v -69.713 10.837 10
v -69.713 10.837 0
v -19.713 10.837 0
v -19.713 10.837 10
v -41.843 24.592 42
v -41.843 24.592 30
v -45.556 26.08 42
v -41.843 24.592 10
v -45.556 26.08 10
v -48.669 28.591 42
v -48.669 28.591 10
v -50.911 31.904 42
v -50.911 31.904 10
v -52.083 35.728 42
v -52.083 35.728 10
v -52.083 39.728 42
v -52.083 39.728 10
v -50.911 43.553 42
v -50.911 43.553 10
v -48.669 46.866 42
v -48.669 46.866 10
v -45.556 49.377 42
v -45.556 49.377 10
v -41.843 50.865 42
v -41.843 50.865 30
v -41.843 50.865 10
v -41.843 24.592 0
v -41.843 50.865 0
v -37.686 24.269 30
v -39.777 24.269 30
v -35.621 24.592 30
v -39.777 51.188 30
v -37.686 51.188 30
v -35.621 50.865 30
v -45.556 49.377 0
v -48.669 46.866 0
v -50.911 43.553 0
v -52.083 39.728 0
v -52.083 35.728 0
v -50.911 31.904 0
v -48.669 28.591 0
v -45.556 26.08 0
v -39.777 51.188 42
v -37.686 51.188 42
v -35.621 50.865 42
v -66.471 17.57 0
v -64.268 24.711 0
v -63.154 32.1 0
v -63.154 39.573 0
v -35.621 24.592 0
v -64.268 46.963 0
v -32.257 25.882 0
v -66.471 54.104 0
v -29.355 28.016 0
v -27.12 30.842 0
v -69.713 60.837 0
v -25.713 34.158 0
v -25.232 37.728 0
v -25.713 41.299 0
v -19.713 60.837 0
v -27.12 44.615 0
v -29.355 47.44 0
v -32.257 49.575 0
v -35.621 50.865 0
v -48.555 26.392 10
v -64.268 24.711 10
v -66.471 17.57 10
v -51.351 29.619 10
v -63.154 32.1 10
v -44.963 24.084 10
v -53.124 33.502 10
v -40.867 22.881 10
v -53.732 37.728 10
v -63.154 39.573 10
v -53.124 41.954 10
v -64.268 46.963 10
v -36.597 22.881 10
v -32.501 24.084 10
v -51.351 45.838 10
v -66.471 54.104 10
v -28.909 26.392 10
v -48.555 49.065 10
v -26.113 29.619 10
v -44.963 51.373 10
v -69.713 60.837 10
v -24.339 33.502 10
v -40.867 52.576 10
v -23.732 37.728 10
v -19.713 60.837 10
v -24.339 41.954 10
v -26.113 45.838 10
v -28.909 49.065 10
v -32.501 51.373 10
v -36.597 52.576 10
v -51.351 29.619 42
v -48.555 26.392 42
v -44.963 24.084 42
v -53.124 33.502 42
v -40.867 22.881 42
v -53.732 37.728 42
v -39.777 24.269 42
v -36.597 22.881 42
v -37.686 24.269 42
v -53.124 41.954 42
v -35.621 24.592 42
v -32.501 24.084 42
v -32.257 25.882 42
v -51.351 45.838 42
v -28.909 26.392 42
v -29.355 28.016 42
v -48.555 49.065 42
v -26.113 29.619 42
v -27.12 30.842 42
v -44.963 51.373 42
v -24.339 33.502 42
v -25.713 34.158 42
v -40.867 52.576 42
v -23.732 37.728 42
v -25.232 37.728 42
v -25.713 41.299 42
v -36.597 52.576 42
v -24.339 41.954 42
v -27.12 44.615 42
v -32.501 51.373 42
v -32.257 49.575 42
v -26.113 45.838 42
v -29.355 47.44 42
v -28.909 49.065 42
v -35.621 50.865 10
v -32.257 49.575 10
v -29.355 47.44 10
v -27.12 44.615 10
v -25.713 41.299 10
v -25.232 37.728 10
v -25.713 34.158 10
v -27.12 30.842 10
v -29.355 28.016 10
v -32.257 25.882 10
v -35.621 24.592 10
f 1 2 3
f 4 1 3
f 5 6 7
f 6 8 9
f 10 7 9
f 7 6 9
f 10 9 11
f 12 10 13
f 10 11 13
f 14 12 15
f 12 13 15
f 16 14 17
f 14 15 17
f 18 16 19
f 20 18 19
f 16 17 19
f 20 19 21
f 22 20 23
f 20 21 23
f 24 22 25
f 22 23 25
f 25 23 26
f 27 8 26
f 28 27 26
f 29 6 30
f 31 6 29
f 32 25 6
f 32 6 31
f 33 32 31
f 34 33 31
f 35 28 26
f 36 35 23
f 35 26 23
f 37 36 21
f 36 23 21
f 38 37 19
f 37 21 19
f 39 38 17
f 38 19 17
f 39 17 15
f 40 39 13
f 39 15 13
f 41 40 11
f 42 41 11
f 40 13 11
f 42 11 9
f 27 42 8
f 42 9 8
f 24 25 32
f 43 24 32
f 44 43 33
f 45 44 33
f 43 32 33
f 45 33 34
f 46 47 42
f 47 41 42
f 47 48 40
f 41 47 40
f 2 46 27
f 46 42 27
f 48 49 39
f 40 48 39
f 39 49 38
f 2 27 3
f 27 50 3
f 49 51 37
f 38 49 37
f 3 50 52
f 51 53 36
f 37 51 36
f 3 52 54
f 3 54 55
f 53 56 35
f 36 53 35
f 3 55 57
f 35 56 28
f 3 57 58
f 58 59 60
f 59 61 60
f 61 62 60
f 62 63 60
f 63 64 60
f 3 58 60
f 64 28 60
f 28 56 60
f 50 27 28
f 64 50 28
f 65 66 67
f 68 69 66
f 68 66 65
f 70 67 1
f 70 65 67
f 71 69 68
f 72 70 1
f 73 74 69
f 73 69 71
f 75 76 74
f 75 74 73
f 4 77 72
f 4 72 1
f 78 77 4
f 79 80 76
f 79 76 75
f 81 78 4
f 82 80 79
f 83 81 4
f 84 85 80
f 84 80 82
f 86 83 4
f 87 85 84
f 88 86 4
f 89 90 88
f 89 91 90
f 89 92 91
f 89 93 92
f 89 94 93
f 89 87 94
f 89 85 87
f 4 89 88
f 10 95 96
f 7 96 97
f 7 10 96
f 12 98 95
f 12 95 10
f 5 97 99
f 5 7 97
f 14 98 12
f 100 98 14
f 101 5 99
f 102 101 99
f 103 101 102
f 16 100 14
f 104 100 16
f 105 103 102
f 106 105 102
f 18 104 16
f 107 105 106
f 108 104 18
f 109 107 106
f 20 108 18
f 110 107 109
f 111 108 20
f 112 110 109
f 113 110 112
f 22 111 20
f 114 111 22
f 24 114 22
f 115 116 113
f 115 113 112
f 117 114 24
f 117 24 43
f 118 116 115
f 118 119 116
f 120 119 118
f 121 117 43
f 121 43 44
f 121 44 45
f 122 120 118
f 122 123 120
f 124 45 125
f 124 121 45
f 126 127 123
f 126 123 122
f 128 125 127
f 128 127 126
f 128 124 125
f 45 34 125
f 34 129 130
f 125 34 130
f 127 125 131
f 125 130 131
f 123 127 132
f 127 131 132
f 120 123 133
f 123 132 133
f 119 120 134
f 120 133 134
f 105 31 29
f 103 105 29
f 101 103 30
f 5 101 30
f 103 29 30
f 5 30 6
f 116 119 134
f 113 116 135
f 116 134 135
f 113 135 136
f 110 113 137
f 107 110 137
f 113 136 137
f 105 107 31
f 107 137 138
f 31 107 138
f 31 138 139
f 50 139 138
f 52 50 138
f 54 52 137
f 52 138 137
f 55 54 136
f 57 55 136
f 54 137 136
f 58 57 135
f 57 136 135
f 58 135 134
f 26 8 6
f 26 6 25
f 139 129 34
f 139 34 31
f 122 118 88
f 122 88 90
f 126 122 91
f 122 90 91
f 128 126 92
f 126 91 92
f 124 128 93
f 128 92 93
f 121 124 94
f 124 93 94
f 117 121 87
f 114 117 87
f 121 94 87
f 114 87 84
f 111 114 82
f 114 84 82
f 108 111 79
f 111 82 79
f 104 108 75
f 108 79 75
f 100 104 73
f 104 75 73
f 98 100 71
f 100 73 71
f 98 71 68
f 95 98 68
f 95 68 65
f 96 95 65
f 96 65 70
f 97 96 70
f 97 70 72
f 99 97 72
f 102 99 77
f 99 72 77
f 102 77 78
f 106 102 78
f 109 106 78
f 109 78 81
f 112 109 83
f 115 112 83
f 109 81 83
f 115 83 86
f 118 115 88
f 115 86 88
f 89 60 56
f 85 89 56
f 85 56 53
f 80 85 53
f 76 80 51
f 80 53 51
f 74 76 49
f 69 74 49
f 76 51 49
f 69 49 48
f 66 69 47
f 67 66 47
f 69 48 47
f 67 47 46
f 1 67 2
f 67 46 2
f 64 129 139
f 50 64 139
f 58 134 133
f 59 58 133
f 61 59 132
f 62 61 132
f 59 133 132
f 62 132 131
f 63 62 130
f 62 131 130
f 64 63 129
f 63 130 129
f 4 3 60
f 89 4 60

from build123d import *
from build123d import SkipClean  # not in build123d's __all__

# Parameters (mm, degrees)
F1_DEPTH = 10
F2_R     = 15
F3_DEPTH = 32
F4_DEPTH = 25
F5_DEPTH = 20


with BuildPart() as f1:
    # F0 (on Top) → F1 (new body)
    with BuildSketch(Plane.XY):
        with BuildLine():
            Line((-19.7133726581, 60.8366520235), (-69.7133726581, 60.8366520235))
            ThreePointArc((-69.7133726581, 60.8366520235), (-63.0146428473, 35.8366520235), (-69.7133726581, 10.8366520235))
            Line((-69.7133726581, 10.8366520235), (-19.7133726581, 10.8366520235))
            Line((-19.7133726581, 10.8366520235), (-19.7133726581, 60.8366520235))
        make_face()
    extrude(amount=F1_DEPTH)

    # F2 (on face) → F3 (join)
    with BuildSketch(Plane.XY.offset(10)):
        with Locations((-38.7318296711, 37.7283993232)):
            Circle(F2_R)
        with BuildLine():
            ThreePointArc((-35.6207755692, 50.8650405369), (-28.1429385494, 46.1024894119), (-25.2318296711, 37.7283993232))
            ThreePointArc((-25.2318296711, 37.7283993232), (-28.1429385494, 29.3543092346), (-35.6207755692, 24.5917581096))
            ThreePointArc((-35.6207755692, 24.5917581096), (-38.7318296711, 24.2283993232), (-41.8428837729, 24.5917581096))
            ThreePointArc((-41.8428837729, 24.5917581096), (-52.2318296711, 37.7283993232), (-41.8428837729, 50.8650405369))
            ThreePointArc((-41.8428837729, 50.8650405369), (-38.7318296711, 51.2283993232), (-35.6207755692, 50.8650405369))
        make_face(mode=Mode.SUBTRACT)
    extrude(amount=F3_DEPTH)

    # F2 (on face) → F4 (cut)
    with BuildSketch(Plane.XY.offset(10)):
        with BuildLine():
            Line((-41.8428837729, 24.5917581096), (-41.8428837729, 50.8650405369))
            ThreePointArc((-41.8428837729, 50.8650405369), (-52.2318296711, 37.7283993232), (-41.8428837729, 24.5917581096))
        make_face()
        with BuildLine():
            ThreePointArc((-35.6207755692, 24.5917581096), (-28.1429385494, 29.3543092346), (-25.2318296711, 37.7283993232))
            ThreePointArc((-25.2318296711, 37.7283993232), (-28.1429385494, 46.1024894119), (-35.6207755692, 50.8650405369))
            Line((-35.6207755692, 50.8650405369), (-35.6207755692, 24.5917581096))
        make_face()
    with SkipClean():  # cleaning this boolean's faces spoils the solid; the shape is the same uncleaned
        extrude(amount=-F4_DEPTH, mode=Mode.SUBTRACT)

    # F5 (add): a face of the model
    f5_faces = [f1.faces().sort_by_distance(p)[0] for p in [
        (-38.7318296711, 37.7283993232, 10),
    ]]
    with SkipClean():  # cleaning this boolean's faces spoils the solid; the shape is the same uncleaned
        extrude(f5_faces, amount=F5_DEPTH)


solid = f1.part
